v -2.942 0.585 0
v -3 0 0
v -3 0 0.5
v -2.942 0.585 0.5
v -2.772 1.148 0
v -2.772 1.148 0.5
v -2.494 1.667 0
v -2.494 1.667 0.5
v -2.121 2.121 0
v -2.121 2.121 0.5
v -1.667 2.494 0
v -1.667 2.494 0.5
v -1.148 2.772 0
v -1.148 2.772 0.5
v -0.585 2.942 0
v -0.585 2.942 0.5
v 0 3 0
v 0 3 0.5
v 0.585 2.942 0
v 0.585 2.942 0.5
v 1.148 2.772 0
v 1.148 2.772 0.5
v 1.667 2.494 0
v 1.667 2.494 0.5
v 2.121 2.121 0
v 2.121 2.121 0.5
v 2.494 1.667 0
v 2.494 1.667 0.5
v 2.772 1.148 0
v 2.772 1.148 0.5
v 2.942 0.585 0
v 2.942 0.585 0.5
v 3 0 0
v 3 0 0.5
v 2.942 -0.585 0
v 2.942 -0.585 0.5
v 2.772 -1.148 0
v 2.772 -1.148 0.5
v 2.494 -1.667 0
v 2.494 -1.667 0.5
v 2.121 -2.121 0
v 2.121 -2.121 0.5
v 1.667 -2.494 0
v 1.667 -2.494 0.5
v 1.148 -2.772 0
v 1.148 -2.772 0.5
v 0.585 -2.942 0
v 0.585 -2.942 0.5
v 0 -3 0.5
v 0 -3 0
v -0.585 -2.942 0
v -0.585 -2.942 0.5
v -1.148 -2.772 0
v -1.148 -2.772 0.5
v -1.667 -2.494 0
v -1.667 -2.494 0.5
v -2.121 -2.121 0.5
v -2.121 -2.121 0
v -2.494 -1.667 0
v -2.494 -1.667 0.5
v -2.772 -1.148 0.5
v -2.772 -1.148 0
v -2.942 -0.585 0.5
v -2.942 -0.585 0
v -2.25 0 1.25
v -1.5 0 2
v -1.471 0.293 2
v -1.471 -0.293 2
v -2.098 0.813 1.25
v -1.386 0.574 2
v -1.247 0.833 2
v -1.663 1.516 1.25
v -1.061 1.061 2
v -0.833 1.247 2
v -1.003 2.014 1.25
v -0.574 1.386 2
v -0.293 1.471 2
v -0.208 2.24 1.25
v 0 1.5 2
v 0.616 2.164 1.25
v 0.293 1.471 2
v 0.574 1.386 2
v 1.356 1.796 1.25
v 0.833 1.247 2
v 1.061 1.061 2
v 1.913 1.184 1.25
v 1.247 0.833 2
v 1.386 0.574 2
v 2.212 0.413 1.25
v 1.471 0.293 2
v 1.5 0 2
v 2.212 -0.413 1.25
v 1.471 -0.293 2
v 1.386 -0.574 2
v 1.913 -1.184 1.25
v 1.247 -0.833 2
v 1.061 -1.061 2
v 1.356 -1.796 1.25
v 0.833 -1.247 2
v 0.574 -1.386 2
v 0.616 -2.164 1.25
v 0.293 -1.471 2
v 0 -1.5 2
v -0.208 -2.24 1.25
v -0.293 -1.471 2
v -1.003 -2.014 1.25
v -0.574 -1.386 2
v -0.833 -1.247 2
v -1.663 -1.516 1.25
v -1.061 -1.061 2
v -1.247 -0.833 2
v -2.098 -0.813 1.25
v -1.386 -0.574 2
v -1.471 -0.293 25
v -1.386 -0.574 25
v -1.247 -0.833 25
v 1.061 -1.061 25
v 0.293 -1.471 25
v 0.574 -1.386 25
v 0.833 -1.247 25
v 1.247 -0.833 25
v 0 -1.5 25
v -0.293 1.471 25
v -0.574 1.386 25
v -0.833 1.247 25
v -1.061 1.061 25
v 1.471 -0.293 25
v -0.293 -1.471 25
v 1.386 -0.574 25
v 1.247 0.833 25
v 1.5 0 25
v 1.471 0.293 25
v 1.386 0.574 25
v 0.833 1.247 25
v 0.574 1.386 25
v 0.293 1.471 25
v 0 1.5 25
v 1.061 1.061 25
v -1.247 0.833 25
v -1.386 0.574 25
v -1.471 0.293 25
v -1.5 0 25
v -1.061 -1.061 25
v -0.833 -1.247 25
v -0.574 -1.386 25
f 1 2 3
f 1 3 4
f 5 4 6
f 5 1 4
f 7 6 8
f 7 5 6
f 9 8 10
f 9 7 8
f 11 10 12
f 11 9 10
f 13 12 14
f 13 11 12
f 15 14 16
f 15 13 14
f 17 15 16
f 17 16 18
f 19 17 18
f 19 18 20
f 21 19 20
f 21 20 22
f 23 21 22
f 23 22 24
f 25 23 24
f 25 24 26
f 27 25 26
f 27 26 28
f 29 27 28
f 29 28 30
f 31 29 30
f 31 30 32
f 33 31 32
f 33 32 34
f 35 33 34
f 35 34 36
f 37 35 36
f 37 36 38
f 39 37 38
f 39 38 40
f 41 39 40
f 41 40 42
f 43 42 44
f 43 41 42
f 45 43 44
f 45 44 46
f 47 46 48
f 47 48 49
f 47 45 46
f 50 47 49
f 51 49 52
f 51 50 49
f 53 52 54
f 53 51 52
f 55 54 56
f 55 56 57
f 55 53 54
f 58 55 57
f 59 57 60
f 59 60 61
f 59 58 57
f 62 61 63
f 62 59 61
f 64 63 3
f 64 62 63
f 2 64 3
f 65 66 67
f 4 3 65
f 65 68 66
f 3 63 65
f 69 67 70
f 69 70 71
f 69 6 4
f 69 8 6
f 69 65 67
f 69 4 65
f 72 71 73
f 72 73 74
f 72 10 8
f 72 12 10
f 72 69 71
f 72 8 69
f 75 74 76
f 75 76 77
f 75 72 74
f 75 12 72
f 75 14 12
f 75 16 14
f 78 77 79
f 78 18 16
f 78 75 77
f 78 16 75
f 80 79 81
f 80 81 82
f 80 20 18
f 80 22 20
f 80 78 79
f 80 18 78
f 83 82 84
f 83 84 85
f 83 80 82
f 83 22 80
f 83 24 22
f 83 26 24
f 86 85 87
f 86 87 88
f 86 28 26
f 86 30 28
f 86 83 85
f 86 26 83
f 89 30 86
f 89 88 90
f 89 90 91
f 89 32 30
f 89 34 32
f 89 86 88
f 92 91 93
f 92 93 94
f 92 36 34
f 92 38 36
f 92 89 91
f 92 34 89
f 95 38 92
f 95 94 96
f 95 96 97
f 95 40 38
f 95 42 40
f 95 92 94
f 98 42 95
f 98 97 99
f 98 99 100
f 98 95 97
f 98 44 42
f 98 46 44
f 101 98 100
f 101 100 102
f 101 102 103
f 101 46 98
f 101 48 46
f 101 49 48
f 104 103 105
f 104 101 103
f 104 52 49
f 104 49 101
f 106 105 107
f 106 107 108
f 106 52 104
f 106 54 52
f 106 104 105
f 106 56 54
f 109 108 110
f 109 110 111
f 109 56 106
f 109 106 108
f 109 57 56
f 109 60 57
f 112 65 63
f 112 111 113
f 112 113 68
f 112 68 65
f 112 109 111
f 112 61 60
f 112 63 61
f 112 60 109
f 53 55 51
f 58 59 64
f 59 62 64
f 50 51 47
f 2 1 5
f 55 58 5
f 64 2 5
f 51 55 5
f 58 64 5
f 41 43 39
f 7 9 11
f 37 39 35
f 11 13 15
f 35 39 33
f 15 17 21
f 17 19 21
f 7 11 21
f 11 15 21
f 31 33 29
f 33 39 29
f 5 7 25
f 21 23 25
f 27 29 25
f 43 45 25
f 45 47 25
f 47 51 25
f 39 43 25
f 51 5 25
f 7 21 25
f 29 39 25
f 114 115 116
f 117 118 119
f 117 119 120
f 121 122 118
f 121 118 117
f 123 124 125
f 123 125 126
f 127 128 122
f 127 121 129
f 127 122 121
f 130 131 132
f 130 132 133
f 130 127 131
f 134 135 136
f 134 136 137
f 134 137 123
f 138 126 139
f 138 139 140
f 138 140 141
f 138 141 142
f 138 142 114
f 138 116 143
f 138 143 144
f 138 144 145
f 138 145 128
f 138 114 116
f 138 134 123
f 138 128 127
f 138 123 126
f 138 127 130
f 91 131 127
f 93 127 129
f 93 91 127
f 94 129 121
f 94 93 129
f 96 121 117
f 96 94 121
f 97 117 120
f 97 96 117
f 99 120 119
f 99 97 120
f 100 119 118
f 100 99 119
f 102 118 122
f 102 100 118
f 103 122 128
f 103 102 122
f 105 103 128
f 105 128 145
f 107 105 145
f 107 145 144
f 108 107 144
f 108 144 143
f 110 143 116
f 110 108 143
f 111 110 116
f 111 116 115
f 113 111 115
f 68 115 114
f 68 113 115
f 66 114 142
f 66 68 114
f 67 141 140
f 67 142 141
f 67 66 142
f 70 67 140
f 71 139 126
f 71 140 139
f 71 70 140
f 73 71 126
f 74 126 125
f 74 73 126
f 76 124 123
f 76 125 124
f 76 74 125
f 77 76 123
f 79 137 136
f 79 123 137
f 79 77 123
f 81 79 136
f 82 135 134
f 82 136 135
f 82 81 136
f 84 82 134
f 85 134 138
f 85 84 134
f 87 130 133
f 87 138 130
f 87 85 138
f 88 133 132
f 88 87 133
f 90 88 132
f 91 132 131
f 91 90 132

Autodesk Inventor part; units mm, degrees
ref_plane "YZ Plane" through (0, 0, 0) normal (1, 0, 0) x (0, 1, 0)
ref_plane "XZ Plane" through (0, 0, 0) normal (0, 1, 0) x (-1, 0, 0)
ref_plane "XY Plane" through (0, 0, 0) normal (0, 0, 1) x (1, 0, 0)
sketch "スケッチ1" plane through (0, 0, 0) normal (0, 0, 1) x (1, 0, 0)
  circle A0 centre (0, 0) radius 1.5
  dimension "d0" = 3
extrude "押し出し1" add sketch "スケッチ1" along normal blind 25
sketch "スケッチ2" plane through (0, 0, 0) normal (0, 0, -1) x (-1, 0, 0)
  circle A0 centre (0, 0) radius 3
  dimension "d3" = 6
extrude "押し出し2" add sketch "スケッチ2" against normal blind 2
thread "ねじ1" size "M3x0.5" class "6g" standard "ANSI Metric M Profile" full length
chamfer "面取り1" distance 1.5 angle 45 1 edges at (3, 0, 2)
properties part number "ネジ皿m3,26" material "鋼、高強度、低合金"
